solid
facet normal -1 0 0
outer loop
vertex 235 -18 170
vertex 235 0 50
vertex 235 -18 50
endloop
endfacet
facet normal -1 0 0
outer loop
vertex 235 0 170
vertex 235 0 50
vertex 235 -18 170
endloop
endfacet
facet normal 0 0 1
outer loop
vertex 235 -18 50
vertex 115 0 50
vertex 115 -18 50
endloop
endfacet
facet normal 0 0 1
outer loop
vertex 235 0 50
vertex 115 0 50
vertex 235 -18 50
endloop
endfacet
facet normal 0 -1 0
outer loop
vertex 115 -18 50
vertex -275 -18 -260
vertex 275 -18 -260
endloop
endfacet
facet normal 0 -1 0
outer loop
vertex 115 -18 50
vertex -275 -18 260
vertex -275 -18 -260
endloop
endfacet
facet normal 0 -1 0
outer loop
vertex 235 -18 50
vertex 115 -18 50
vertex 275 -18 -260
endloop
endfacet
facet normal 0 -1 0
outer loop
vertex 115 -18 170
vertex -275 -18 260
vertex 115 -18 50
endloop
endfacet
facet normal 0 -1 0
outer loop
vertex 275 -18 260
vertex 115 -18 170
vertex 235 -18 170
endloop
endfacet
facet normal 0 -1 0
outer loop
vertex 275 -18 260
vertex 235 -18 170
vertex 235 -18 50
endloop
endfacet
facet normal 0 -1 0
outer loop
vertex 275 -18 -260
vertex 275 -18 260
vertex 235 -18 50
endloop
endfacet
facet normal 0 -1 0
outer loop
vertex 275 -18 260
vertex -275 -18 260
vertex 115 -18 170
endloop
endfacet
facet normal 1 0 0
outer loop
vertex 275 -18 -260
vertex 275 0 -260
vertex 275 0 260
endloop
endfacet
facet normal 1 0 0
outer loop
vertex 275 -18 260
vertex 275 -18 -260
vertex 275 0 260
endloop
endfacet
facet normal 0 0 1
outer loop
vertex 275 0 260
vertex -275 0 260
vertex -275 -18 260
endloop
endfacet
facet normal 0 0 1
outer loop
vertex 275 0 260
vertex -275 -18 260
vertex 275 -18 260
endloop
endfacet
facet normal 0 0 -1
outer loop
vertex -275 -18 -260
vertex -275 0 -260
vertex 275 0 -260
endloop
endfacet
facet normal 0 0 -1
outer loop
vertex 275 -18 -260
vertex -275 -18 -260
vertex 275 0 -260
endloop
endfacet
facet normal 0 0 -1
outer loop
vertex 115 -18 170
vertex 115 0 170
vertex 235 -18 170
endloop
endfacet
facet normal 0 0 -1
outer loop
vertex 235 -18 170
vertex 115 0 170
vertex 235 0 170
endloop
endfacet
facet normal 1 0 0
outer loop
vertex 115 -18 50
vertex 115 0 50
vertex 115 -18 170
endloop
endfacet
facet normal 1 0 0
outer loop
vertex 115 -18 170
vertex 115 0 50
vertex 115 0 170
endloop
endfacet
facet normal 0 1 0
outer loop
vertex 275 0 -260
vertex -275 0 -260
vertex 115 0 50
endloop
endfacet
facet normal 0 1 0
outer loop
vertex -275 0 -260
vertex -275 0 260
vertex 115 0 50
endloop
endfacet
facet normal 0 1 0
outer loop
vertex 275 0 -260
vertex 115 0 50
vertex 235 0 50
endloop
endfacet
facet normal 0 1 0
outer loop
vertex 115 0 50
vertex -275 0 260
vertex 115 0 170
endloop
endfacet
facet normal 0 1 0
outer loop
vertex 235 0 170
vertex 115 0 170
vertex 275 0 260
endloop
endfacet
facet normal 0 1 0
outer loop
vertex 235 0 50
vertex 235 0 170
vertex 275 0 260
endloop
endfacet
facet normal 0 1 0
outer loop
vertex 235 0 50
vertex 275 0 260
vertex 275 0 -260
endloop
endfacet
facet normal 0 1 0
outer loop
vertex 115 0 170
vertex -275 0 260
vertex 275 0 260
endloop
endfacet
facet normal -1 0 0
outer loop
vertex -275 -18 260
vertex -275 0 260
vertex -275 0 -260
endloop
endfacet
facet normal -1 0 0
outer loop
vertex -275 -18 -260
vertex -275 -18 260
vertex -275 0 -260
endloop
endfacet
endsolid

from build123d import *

# Parameters (mm, degrees)
F0_W     = 550
F0_H     = 50
F0_H_2   = 420
F0_W_2   = 120
F0_H_3   = 120
F1_DEPTH = 18


with BuildPart() as f1:
    # F0 (on Front) → F1 (new body)
    with BuildSketch(Plane.XZ):
        with Locations((0, -235)):
            Rectangle(F0_W, F0_H)
        Rectangle(F0_W, F0_H_2)
        with Locations((175, 110)):
            Rectangle(F0_W_2, F0_H_3, mode=Mode.SUBTRACT)
        with Locations((0, 235)):
            Rectangle(F0_W, F0_H)
    extrude(amount=F1_DEPTH)


solid = f1.part
